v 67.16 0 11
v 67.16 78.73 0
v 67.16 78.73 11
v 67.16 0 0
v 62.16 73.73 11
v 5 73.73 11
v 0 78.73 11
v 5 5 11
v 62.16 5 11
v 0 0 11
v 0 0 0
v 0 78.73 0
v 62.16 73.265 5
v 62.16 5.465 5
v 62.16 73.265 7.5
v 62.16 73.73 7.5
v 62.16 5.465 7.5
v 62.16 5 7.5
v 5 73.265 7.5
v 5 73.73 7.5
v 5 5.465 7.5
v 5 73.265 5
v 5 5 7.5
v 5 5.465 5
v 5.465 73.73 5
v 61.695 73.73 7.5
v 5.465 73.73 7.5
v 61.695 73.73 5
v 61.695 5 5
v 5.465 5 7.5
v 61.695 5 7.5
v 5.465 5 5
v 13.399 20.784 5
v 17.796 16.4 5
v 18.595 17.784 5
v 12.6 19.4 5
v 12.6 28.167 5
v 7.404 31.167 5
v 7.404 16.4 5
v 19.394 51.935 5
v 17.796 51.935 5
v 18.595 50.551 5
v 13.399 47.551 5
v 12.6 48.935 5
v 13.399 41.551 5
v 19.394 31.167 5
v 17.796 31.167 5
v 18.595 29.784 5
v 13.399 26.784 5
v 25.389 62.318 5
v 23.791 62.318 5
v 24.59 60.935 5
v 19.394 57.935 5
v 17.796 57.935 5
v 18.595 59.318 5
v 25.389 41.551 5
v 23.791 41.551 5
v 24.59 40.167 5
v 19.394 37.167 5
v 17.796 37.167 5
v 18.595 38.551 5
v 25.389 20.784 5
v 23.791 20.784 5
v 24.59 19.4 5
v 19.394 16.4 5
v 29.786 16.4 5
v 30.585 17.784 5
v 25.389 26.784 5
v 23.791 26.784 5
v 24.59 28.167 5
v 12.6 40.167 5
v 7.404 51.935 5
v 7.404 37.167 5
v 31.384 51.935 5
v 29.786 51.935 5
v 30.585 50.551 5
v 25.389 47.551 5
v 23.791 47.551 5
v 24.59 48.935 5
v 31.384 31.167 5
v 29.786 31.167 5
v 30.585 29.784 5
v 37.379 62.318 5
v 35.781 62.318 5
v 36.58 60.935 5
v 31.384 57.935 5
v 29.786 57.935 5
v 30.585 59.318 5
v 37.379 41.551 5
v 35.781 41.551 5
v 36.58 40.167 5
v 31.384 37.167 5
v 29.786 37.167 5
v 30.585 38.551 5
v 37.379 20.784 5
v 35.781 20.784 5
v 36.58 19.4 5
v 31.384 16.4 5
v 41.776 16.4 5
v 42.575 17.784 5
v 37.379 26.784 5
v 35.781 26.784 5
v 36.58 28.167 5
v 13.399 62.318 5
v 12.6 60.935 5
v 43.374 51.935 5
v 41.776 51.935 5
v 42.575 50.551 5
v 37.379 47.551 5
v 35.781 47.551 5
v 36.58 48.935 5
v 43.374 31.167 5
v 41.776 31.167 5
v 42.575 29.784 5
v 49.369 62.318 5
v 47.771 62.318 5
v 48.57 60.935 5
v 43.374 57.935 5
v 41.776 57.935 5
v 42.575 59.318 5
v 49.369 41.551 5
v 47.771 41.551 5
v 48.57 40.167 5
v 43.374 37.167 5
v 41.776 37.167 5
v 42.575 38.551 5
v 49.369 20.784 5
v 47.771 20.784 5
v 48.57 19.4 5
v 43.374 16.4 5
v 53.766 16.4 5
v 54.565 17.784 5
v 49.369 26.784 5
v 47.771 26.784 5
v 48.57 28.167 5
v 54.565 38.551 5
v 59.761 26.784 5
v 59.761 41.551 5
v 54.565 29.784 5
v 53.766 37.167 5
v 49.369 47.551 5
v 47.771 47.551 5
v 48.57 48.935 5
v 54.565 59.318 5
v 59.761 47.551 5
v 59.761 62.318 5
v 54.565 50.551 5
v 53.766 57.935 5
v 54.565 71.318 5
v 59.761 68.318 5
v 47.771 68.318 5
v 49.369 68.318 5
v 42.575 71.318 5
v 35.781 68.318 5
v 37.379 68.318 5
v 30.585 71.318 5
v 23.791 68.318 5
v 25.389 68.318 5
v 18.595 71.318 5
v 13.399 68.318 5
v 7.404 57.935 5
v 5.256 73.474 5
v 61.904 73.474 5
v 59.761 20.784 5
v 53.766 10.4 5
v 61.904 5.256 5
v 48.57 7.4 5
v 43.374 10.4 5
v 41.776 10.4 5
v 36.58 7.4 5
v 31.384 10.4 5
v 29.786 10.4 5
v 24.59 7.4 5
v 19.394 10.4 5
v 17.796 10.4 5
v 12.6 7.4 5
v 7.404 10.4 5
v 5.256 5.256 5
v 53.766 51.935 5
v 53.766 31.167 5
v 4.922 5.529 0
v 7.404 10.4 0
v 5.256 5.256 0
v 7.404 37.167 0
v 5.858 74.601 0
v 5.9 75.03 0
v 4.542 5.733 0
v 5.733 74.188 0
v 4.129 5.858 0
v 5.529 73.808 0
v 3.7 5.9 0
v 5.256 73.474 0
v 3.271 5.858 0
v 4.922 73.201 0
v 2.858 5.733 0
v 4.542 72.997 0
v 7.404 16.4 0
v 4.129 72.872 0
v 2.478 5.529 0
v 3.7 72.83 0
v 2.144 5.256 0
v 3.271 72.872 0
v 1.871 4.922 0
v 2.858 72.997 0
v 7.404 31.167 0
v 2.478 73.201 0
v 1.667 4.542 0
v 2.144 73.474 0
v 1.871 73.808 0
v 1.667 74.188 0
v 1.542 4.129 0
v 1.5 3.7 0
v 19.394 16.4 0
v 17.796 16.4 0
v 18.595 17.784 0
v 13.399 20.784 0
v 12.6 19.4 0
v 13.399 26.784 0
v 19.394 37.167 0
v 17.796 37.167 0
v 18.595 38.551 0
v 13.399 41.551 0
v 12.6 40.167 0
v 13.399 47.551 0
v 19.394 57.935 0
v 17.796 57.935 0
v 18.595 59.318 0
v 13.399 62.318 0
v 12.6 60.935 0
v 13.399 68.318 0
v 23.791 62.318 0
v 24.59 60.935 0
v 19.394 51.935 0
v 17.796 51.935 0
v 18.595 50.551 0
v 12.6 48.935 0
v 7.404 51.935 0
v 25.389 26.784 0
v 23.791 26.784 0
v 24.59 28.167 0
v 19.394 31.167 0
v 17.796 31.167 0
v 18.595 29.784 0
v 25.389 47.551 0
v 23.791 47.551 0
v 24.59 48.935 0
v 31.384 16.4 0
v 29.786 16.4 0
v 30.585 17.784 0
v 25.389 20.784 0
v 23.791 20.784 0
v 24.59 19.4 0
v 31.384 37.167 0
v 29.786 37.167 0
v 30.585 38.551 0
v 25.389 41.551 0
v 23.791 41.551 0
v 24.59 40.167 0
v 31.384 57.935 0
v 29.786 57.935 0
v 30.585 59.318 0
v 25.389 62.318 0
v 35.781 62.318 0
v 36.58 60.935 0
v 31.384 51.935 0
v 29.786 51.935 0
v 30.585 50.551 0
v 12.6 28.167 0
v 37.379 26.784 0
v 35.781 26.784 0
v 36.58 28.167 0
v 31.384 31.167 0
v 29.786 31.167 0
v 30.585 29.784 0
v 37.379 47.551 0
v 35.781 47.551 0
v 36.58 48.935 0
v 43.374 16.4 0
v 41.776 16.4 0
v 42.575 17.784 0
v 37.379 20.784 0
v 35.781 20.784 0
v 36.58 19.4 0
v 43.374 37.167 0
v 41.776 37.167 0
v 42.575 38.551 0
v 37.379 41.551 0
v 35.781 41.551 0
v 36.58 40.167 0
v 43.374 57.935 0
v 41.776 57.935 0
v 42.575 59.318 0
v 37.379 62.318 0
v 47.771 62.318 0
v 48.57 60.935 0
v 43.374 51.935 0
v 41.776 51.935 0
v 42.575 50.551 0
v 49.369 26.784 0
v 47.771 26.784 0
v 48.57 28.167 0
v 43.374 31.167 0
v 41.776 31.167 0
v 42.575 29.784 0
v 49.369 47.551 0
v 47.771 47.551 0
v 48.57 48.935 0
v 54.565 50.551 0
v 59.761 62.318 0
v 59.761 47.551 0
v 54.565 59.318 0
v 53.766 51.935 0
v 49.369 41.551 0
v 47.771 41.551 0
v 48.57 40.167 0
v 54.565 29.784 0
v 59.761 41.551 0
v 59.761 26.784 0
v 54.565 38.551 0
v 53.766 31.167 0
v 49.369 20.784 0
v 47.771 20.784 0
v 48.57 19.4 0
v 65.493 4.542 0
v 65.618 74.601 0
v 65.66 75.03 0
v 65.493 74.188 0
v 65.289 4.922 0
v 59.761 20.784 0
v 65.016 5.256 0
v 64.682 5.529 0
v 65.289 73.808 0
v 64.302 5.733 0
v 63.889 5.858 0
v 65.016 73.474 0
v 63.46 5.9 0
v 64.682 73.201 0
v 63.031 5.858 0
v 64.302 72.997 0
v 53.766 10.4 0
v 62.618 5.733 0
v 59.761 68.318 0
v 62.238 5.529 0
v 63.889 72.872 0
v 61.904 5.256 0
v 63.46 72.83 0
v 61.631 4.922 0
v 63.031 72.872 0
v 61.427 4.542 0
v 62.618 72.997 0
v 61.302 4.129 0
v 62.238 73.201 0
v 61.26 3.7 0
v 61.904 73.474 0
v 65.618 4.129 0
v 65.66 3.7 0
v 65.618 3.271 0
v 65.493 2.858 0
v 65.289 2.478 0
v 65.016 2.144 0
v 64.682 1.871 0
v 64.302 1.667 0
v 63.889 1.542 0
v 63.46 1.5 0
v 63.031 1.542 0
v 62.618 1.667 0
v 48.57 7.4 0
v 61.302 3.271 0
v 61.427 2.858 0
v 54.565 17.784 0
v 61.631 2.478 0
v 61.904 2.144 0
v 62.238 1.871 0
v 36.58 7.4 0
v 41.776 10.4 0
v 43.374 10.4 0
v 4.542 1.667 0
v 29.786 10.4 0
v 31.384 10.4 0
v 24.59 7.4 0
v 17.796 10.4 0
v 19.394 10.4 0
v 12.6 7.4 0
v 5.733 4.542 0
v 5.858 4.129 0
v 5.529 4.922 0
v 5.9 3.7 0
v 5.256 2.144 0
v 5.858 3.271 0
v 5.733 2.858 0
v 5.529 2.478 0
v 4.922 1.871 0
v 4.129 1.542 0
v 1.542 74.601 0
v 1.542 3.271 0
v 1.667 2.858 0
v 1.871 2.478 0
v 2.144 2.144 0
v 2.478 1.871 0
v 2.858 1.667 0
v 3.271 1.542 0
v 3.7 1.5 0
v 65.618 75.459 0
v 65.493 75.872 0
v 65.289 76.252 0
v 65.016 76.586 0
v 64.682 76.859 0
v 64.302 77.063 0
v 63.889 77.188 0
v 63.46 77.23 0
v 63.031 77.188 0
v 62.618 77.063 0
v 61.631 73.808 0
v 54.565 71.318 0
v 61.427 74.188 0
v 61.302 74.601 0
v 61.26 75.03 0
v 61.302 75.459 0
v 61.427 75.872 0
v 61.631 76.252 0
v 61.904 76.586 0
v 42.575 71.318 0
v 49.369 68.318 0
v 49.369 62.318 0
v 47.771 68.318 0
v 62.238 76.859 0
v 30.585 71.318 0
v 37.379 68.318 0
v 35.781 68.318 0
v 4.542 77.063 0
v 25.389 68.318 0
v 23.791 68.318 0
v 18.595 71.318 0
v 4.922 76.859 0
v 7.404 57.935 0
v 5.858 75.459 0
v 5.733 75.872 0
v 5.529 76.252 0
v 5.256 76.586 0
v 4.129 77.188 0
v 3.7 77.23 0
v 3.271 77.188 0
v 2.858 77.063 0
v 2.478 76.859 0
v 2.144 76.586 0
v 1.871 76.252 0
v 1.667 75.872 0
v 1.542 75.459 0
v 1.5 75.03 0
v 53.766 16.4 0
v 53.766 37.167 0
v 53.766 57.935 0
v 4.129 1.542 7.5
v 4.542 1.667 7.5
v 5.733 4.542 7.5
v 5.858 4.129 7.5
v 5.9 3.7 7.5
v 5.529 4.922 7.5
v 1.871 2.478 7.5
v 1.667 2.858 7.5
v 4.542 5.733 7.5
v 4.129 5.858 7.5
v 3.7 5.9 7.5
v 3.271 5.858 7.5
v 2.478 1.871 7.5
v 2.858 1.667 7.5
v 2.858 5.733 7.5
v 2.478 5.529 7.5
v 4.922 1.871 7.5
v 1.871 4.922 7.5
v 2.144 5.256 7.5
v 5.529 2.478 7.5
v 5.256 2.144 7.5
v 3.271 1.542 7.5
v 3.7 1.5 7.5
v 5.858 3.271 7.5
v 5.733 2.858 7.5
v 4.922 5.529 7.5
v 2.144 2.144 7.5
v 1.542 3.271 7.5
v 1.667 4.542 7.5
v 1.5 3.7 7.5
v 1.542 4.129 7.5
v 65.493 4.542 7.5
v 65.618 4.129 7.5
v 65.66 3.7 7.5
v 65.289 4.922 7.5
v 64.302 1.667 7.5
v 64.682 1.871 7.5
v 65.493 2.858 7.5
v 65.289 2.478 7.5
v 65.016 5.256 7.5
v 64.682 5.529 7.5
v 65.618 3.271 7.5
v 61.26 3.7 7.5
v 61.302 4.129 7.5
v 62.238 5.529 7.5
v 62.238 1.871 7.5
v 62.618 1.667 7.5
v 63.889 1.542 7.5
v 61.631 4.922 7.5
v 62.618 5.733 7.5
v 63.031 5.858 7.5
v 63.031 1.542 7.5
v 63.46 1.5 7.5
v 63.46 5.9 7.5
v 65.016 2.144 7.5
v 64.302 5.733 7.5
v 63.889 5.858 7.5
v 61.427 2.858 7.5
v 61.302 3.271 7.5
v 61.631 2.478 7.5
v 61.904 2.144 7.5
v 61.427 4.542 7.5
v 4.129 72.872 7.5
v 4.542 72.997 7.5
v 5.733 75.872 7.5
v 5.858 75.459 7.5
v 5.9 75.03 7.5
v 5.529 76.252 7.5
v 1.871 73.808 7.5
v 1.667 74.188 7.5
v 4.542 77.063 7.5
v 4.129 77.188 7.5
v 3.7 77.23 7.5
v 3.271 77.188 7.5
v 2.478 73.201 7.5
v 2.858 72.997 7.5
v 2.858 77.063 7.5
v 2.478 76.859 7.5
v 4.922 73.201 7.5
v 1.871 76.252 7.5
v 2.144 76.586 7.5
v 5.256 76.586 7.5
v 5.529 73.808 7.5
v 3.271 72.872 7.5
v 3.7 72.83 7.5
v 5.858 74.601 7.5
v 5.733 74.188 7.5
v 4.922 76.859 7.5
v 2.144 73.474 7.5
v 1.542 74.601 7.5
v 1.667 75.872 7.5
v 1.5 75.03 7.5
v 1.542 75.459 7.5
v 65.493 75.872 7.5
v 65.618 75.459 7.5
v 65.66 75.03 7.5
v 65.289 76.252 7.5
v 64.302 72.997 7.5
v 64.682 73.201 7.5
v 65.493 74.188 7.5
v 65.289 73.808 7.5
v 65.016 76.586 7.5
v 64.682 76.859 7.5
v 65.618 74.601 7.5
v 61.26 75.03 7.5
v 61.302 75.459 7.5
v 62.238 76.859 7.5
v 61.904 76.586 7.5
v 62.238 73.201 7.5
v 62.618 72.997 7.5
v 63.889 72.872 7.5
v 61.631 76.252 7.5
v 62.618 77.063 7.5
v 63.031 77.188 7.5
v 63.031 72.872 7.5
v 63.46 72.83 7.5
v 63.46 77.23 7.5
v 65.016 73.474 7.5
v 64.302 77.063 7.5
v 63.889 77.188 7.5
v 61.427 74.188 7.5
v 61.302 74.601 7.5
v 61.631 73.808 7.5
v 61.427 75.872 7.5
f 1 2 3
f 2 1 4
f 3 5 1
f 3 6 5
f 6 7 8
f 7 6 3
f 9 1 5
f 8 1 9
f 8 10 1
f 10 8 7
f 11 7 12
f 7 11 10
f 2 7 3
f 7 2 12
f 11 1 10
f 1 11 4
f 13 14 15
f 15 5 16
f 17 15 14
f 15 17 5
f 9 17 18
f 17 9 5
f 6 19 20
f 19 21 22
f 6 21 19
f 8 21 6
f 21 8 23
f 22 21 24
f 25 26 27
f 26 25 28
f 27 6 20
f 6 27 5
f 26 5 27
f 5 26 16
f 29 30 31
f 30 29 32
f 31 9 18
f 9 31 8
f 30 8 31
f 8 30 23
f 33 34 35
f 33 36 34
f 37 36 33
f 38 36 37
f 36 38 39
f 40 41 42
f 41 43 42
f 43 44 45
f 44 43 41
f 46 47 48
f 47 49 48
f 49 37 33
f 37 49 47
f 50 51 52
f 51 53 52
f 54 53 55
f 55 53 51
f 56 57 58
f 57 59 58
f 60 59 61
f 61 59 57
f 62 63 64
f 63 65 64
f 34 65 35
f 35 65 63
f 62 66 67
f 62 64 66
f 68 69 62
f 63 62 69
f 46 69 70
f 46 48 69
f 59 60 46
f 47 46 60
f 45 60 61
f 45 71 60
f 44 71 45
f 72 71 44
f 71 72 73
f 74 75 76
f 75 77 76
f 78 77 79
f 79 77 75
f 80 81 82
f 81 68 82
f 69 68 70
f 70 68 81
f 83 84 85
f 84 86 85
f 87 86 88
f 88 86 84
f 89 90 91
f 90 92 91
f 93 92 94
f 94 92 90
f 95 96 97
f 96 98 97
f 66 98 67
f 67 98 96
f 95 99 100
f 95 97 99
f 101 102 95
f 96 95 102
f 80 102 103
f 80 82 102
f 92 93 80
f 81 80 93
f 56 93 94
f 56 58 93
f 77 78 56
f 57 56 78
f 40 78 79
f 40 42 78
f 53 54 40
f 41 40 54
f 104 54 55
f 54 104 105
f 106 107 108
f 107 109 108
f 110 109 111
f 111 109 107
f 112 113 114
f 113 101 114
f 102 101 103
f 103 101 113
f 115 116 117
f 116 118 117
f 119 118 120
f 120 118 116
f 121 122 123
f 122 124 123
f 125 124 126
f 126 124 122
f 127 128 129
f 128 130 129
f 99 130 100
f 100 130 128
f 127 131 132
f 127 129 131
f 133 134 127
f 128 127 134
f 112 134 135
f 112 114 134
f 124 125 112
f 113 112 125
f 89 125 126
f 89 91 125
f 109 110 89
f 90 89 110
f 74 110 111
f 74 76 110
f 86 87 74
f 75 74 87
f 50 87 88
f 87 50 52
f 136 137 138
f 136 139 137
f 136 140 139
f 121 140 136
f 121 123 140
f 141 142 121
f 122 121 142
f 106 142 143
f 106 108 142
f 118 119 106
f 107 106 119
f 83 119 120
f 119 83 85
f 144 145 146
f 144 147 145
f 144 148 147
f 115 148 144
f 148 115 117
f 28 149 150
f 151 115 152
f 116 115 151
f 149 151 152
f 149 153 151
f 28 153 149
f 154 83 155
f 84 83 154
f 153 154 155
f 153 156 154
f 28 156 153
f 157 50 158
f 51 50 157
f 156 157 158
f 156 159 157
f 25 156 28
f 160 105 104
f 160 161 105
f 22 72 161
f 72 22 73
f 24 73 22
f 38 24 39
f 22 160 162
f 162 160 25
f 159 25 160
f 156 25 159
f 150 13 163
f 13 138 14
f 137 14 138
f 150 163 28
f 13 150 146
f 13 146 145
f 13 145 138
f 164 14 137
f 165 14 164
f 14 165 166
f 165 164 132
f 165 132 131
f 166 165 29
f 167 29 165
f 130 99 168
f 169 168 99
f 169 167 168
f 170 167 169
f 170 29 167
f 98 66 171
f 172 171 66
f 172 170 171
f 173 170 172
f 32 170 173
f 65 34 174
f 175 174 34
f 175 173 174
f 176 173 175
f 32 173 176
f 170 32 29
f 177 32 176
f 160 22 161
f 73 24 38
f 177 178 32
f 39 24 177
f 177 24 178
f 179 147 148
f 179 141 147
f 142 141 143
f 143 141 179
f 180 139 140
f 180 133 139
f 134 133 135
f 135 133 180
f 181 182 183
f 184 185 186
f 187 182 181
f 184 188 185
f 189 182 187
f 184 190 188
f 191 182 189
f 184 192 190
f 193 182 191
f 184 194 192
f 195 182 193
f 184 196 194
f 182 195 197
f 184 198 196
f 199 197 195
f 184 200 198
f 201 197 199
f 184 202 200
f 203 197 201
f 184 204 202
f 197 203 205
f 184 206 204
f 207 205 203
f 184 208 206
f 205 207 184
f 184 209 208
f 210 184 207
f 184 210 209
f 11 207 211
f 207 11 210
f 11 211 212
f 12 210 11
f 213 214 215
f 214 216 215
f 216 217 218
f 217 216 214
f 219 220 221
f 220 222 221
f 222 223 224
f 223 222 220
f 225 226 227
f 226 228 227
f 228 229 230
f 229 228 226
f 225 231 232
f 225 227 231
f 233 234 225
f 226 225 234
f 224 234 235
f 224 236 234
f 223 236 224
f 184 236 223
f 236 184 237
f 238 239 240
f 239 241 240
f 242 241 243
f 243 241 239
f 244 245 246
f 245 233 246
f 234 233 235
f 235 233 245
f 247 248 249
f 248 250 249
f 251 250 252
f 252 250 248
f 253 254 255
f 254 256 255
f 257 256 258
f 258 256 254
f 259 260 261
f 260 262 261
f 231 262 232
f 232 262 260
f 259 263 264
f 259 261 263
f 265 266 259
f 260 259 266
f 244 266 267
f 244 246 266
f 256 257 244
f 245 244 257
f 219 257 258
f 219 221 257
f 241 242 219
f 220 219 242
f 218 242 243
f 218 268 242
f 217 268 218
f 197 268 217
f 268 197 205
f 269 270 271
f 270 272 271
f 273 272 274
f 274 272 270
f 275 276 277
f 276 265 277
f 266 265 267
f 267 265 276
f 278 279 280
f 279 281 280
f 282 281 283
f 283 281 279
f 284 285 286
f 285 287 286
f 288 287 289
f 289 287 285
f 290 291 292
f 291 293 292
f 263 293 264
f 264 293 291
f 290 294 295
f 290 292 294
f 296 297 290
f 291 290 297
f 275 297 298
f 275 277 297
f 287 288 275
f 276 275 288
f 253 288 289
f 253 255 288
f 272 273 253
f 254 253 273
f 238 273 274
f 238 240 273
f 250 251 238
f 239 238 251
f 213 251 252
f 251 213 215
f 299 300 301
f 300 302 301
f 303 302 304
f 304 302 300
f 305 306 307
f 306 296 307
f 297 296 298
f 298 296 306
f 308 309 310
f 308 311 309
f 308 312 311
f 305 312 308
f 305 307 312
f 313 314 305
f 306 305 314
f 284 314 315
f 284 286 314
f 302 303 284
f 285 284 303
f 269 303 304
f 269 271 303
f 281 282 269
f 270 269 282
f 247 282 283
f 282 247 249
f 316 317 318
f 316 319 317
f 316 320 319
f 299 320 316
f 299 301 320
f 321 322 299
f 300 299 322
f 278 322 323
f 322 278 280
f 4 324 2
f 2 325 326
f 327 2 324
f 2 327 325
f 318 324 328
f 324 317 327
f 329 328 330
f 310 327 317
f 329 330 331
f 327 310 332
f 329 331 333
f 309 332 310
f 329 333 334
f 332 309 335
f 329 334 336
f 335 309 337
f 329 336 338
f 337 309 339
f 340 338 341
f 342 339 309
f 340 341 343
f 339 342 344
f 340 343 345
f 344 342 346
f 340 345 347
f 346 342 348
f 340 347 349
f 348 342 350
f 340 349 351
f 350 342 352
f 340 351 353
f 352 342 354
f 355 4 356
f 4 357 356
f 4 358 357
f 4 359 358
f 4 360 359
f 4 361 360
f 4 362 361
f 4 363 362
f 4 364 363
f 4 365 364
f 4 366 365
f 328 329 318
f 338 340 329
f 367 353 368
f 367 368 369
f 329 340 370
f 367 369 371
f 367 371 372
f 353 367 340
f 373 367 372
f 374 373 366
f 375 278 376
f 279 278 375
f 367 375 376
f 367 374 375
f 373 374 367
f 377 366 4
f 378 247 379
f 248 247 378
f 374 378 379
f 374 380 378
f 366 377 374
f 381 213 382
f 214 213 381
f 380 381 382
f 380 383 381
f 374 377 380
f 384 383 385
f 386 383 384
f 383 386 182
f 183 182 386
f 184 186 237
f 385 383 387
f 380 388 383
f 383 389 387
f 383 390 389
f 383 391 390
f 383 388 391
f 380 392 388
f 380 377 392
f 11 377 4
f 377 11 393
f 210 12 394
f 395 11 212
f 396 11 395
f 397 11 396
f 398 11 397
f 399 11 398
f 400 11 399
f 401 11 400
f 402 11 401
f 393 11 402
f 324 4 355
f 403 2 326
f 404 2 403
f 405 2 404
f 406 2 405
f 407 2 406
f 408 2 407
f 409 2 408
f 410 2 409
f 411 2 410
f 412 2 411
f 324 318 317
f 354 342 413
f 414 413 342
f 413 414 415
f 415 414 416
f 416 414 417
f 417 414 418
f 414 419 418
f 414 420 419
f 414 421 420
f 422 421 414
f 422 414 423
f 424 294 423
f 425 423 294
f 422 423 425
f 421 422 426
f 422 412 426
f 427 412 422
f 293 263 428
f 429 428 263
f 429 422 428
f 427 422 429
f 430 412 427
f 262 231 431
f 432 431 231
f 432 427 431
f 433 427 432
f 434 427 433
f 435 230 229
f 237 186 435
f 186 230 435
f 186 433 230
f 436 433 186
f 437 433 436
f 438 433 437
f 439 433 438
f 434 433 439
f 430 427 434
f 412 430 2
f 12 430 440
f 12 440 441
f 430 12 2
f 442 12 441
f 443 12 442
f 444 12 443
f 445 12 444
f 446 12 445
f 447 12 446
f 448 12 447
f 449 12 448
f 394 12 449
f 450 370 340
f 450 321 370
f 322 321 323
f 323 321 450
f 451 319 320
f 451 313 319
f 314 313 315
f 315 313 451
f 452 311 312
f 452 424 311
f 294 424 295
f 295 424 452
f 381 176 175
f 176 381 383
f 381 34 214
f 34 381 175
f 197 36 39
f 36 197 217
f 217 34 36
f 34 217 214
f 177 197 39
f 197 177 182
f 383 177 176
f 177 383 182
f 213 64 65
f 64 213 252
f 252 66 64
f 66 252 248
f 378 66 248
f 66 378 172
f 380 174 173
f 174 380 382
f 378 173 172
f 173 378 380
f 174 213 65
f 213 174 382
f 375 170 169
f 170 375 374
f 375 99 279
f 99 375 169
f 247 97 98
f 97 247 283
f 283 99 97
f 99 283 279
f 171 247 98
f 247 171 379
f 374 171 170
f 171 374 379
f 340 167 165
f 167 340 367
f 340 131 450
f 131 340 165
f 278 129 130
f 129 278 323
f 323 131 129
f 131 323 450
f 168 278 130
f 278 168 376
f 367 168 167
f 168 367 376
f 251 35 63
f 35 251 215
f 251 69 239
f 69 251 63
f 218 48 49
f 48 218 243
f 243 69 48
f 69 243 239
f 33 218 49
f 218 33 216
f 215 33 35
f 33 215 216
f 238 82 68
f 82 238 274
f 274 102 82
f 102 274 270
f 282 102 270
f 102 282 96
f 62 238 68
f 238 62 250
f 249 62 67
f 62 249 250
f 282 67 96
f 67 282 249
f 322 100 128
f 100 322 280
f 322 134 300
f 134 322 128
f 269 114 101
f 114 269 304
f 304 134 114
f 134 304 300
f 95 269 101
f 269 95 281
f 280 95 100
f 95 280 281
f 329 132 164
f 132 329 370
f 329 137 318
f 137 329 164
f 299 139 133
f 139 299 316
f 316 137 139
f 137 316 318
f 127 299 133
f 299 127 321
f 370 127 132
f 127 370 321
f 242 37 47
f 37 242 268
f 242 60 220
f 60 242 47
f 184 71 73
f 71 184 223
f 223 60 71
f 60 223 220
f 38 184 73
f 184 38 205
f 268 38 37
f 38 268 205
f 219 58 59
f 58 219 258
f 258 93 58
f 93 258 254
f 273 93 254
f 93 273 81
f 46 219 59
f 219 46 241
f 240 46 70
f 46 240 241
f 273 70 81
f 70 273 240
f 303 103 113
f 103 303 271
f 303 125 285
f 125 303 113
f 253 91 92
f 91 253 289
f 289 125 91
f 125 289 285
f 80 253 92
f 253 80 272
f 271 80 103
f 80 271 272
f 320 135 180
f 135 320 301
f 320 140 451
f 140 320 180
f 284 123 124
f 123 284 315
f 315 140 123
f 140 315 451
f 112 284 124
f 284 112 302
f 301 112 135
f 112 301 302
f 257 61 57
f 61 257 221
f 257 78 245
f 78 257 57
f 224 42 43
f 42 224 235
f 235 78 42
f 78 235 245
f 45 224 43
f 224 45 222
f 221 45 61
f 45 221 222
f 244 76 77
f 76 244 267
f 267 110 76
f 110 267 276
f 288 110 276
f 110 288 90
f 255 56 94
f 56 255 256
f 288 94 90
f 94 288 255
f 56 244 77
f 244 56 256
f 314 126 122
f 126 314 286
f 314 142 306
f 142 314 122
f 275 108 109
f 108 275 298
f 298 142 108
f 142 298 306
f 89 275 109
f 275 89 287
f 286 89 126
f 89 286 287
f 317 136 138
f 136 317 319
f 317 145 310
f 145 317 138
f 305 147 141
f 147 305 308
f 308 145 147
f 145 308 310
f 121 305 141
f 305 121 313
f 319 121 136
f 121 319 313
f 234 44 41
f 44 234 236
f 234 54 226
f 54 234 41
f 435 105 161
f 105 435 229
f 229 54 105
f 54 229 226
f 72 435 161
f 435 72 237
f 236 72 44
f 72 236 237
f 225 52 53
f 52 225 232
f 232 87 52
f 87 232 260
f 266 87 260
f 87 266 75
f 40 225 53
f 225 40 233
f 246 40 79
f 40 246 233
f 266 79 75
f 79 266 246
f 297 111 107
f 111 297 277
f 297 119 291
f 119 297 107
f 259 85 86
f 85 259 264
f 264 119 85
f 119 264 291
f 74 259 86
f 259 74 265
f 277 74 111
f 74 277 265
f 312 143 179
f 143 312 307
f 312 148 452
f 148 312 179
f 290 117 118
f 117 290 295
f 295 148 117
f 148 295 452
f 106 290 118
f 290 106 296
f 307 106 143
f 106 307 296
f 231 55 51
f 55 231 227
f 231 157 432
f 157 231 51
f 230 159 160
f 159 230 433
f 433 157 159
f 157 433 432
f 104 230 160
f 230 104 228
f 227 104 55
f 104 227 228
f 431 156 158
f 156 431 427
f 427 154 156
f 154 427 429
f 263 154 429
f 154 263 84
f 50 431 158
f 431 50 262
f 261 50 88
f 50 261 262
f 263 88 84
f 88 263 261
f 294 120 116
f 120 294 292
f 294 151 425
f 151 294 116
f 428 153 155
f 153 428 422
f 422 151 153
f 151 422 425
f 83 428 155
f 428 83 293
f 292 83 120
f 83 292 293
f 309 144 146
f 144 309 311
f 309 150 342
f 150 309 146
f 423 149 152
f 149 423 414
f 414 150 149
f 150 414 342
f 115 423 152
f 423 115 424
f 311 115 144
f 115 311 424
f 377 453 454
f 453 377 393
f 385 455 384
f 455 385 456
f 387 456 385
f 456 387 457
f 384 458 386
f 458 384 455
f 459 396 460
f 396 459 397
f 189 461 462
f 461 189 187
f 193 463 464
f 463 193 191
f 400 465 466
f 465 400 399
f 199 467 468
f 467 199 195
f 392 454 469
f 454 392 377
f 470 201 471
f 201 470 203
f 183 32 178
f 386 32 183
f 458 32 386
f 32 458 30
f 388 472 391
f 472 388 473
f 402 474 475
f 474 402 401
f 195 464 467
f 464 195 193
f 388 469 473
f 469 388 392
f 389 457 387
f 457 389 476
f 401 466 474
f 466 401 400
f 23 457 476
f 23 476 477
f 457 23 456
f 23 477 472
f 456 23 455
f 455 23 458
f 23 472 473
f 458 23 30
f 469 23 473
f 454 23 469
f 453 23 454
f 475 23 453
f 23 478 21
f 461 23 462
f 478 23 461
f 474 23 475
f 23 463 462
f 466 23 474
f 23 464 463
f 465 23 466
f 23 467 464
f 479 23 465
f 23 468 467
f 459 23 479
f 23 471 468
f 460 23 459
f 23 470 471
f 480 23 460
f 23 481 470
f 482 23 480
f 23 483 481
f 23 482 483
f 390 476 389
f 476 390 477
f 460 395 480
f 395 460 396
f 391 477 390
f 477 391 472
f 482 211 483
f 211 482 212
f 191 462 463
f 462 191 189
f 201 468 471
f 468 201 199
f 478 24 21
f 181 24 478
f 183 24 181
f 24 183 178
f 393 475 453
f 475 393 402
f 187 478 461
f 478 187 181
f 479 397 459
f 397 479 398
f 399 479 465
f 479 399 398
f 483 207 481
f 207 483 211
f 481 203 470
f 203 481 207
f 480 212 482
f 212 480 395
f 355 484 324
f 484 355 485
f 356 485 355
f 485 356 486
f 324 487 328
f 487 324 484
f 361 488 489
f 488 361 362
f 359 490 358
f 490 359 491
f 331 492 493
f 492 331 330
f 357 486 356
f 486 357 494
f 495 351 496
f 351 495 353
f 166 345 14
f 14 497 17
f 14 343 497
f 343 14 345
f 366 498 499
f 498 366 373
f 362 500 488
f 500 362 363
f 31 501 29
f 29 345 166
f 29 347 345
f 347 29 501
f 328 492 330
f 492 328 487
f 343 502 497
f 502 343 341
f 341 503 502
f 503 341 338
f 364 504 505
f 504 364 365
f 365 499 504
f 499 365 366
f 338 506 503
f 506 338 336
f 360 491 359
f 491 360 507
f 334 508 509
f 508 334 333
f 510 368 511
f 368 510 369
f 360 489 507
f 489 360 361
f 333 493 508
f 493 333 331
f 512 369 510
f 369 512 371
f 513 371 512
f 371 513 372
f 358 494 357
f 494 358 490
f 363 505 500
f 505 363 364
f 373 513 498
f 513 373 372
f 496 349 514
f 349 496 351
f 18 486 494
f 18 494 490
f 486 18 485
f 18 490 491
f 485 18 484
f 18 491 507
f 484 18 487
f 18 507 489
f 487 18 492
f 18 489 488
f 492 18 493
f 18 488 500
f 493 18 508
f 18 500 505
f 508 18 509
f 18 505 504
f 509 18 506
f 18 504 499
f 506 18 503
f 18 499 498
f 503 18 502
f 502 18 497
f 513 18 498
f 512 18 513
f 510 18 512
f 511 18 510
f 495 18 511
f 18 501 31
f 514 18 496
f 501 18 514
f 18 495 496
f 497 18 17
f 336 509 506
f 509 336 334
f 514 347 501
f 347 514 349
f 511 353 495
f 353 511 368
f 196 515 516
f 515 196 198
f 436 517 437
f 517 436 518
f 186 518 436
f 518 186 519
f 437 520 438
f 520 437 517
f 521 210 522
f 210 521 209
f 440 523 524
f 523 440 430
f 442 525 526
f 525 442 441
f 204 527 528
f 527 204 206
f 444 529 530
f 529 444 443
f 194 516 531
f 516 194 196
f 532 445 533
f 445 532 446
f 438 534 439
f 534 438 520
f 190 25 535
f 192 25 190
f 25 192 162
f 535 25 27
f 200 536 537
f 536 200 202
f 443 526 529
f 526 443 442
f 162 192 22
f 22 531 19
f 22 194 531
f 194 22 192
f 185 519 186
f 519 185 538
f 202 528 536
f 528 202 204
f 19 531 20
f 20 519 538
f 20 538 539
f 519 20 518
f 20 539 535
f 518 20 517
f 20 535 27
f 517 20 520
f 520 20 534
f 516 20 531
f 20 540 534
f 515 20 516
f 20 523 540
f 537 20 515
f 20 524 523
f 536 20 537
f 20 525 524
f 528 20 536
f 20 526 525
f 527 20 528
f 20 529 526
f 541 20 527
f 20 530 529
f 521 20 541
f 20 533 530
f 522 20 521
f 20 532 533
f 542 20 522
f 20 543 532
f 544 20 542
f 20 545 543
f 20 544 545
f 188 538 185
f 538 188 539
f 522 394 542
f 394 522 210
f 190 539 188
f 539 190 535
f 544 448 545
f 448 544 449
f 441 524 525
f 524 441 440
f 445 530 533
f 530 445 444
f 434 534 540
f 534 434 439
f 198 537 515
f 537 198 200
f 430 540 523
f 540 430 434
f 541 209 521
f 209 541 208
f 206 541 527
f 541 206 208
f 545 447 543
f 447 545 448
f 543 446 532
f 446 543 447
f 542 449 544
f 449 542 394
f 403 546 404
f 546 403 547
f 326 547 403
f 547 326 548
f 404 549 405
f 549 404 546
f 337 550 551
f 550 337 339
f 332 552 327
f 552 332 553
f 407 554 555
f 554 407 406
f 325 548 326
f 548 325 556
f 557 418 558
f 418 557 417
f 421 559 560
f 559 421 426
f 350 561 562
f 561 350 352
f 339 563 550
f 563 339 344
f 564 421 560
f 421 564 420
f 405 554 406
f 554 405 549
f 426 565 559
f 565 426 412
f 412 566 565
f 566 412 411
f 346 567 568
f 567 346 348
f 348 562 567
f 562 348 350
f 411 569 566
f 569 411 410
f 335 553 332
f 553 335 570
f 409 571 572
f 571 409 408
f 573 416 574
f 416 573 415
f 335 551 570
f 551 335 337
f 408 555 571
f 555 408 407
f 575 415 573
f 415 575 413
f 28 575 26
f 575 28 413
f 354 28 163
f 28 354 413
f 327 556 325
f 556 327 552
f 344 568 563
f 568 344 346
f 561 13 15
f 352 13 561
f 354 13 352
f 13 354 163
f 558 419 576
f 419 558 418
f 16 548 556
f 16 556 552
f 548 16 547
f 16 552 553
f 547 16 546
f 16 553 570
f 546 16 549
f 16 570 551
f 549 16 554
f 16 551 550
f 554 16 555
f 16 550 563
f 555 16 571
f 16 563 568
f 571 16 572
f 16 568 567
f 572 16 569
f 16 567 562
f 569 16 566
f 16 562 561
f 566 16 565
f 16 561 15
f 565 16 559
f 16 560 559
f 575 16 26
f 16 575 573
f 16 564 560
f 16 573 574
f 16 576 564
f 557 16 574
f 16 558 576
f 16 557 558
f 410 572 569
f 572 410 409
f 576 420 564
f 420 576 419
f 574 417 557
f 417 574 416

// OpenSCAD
$fn = 32;

// ----------------------------------------------------------------------
// Honeycomb panel: 67.16 x 78.73 mm, 24 cells of 12 mm
// ----------------------------------------------------------------------

// --- parameters (mm) ---
panel_w = 67.16;          // panel width
panel_d = 78.73;          // panel depth
thick = 5;                // panel thickness
cell_r = 6;               // hex cell circumradius
pitch = 11.99;            // hex cell pitch (centre to centre)
web = 1.6;                // web between the cells
columns = 4;              // columns of cells
rows = 6;                 // rows of cells
cell_count = 24;          // total cells
shift_x = 12.6;           // first cell offset in x
shift_y = 13.4;           // first cell offset in y
mount_d = 4.4;            // corner mounting holes
hole_off = 3.7;           // mounting hole offset from the corners
rim_h = 11;               // rim height
rim_t = 5;                // rim wall thickness

difference() {
  union() {
    cube([panel_w, panel_d, thick]);
    /* rim around the panel, sunk 1 mm into the plate */
    translate([0, 0, thick - 1]) difference() {
      cube([panel_w, panel_d, rim_h - thick + 1]);
      translate([rim_t, rim_t, -2.5]) cube([panel_w - 2 * rim_t, panel_d - 2 * rim_t, rim_h - thick + 6]);
    }
  }
  /* hexagonal cells, point-up, cut right through the plate */
  for (row = [0 : rows - 1]) {
    for (col = [0 : columns - 1]) {
      translate([shift_x + col * pitch + (row % 2) * pitch / 2, shift_y + row * pitch * 0.866025, -2.5]) rotate([0, 0, 30]) cylinder(h = thick + 5, d = 2 * cell_r, $fn = 6);
    }
  }
  /* corner mounting holes, clear of the outer cell web */
  translate([3.7, 3.7, -2.5]) cylinder(h = thick + 5, d = mount_d);
  translate([63.46, 3.7, -2.5]) cylinder(h = thick + 5, d = mount_d);
  translate([3.7, 75.03, -2.5]) cylinder(h = thick + 5, d = mount_d);
  translate([63.46, 75.03, -2.5]) cylinder(h = thick + 5, d = mount_d);
}
